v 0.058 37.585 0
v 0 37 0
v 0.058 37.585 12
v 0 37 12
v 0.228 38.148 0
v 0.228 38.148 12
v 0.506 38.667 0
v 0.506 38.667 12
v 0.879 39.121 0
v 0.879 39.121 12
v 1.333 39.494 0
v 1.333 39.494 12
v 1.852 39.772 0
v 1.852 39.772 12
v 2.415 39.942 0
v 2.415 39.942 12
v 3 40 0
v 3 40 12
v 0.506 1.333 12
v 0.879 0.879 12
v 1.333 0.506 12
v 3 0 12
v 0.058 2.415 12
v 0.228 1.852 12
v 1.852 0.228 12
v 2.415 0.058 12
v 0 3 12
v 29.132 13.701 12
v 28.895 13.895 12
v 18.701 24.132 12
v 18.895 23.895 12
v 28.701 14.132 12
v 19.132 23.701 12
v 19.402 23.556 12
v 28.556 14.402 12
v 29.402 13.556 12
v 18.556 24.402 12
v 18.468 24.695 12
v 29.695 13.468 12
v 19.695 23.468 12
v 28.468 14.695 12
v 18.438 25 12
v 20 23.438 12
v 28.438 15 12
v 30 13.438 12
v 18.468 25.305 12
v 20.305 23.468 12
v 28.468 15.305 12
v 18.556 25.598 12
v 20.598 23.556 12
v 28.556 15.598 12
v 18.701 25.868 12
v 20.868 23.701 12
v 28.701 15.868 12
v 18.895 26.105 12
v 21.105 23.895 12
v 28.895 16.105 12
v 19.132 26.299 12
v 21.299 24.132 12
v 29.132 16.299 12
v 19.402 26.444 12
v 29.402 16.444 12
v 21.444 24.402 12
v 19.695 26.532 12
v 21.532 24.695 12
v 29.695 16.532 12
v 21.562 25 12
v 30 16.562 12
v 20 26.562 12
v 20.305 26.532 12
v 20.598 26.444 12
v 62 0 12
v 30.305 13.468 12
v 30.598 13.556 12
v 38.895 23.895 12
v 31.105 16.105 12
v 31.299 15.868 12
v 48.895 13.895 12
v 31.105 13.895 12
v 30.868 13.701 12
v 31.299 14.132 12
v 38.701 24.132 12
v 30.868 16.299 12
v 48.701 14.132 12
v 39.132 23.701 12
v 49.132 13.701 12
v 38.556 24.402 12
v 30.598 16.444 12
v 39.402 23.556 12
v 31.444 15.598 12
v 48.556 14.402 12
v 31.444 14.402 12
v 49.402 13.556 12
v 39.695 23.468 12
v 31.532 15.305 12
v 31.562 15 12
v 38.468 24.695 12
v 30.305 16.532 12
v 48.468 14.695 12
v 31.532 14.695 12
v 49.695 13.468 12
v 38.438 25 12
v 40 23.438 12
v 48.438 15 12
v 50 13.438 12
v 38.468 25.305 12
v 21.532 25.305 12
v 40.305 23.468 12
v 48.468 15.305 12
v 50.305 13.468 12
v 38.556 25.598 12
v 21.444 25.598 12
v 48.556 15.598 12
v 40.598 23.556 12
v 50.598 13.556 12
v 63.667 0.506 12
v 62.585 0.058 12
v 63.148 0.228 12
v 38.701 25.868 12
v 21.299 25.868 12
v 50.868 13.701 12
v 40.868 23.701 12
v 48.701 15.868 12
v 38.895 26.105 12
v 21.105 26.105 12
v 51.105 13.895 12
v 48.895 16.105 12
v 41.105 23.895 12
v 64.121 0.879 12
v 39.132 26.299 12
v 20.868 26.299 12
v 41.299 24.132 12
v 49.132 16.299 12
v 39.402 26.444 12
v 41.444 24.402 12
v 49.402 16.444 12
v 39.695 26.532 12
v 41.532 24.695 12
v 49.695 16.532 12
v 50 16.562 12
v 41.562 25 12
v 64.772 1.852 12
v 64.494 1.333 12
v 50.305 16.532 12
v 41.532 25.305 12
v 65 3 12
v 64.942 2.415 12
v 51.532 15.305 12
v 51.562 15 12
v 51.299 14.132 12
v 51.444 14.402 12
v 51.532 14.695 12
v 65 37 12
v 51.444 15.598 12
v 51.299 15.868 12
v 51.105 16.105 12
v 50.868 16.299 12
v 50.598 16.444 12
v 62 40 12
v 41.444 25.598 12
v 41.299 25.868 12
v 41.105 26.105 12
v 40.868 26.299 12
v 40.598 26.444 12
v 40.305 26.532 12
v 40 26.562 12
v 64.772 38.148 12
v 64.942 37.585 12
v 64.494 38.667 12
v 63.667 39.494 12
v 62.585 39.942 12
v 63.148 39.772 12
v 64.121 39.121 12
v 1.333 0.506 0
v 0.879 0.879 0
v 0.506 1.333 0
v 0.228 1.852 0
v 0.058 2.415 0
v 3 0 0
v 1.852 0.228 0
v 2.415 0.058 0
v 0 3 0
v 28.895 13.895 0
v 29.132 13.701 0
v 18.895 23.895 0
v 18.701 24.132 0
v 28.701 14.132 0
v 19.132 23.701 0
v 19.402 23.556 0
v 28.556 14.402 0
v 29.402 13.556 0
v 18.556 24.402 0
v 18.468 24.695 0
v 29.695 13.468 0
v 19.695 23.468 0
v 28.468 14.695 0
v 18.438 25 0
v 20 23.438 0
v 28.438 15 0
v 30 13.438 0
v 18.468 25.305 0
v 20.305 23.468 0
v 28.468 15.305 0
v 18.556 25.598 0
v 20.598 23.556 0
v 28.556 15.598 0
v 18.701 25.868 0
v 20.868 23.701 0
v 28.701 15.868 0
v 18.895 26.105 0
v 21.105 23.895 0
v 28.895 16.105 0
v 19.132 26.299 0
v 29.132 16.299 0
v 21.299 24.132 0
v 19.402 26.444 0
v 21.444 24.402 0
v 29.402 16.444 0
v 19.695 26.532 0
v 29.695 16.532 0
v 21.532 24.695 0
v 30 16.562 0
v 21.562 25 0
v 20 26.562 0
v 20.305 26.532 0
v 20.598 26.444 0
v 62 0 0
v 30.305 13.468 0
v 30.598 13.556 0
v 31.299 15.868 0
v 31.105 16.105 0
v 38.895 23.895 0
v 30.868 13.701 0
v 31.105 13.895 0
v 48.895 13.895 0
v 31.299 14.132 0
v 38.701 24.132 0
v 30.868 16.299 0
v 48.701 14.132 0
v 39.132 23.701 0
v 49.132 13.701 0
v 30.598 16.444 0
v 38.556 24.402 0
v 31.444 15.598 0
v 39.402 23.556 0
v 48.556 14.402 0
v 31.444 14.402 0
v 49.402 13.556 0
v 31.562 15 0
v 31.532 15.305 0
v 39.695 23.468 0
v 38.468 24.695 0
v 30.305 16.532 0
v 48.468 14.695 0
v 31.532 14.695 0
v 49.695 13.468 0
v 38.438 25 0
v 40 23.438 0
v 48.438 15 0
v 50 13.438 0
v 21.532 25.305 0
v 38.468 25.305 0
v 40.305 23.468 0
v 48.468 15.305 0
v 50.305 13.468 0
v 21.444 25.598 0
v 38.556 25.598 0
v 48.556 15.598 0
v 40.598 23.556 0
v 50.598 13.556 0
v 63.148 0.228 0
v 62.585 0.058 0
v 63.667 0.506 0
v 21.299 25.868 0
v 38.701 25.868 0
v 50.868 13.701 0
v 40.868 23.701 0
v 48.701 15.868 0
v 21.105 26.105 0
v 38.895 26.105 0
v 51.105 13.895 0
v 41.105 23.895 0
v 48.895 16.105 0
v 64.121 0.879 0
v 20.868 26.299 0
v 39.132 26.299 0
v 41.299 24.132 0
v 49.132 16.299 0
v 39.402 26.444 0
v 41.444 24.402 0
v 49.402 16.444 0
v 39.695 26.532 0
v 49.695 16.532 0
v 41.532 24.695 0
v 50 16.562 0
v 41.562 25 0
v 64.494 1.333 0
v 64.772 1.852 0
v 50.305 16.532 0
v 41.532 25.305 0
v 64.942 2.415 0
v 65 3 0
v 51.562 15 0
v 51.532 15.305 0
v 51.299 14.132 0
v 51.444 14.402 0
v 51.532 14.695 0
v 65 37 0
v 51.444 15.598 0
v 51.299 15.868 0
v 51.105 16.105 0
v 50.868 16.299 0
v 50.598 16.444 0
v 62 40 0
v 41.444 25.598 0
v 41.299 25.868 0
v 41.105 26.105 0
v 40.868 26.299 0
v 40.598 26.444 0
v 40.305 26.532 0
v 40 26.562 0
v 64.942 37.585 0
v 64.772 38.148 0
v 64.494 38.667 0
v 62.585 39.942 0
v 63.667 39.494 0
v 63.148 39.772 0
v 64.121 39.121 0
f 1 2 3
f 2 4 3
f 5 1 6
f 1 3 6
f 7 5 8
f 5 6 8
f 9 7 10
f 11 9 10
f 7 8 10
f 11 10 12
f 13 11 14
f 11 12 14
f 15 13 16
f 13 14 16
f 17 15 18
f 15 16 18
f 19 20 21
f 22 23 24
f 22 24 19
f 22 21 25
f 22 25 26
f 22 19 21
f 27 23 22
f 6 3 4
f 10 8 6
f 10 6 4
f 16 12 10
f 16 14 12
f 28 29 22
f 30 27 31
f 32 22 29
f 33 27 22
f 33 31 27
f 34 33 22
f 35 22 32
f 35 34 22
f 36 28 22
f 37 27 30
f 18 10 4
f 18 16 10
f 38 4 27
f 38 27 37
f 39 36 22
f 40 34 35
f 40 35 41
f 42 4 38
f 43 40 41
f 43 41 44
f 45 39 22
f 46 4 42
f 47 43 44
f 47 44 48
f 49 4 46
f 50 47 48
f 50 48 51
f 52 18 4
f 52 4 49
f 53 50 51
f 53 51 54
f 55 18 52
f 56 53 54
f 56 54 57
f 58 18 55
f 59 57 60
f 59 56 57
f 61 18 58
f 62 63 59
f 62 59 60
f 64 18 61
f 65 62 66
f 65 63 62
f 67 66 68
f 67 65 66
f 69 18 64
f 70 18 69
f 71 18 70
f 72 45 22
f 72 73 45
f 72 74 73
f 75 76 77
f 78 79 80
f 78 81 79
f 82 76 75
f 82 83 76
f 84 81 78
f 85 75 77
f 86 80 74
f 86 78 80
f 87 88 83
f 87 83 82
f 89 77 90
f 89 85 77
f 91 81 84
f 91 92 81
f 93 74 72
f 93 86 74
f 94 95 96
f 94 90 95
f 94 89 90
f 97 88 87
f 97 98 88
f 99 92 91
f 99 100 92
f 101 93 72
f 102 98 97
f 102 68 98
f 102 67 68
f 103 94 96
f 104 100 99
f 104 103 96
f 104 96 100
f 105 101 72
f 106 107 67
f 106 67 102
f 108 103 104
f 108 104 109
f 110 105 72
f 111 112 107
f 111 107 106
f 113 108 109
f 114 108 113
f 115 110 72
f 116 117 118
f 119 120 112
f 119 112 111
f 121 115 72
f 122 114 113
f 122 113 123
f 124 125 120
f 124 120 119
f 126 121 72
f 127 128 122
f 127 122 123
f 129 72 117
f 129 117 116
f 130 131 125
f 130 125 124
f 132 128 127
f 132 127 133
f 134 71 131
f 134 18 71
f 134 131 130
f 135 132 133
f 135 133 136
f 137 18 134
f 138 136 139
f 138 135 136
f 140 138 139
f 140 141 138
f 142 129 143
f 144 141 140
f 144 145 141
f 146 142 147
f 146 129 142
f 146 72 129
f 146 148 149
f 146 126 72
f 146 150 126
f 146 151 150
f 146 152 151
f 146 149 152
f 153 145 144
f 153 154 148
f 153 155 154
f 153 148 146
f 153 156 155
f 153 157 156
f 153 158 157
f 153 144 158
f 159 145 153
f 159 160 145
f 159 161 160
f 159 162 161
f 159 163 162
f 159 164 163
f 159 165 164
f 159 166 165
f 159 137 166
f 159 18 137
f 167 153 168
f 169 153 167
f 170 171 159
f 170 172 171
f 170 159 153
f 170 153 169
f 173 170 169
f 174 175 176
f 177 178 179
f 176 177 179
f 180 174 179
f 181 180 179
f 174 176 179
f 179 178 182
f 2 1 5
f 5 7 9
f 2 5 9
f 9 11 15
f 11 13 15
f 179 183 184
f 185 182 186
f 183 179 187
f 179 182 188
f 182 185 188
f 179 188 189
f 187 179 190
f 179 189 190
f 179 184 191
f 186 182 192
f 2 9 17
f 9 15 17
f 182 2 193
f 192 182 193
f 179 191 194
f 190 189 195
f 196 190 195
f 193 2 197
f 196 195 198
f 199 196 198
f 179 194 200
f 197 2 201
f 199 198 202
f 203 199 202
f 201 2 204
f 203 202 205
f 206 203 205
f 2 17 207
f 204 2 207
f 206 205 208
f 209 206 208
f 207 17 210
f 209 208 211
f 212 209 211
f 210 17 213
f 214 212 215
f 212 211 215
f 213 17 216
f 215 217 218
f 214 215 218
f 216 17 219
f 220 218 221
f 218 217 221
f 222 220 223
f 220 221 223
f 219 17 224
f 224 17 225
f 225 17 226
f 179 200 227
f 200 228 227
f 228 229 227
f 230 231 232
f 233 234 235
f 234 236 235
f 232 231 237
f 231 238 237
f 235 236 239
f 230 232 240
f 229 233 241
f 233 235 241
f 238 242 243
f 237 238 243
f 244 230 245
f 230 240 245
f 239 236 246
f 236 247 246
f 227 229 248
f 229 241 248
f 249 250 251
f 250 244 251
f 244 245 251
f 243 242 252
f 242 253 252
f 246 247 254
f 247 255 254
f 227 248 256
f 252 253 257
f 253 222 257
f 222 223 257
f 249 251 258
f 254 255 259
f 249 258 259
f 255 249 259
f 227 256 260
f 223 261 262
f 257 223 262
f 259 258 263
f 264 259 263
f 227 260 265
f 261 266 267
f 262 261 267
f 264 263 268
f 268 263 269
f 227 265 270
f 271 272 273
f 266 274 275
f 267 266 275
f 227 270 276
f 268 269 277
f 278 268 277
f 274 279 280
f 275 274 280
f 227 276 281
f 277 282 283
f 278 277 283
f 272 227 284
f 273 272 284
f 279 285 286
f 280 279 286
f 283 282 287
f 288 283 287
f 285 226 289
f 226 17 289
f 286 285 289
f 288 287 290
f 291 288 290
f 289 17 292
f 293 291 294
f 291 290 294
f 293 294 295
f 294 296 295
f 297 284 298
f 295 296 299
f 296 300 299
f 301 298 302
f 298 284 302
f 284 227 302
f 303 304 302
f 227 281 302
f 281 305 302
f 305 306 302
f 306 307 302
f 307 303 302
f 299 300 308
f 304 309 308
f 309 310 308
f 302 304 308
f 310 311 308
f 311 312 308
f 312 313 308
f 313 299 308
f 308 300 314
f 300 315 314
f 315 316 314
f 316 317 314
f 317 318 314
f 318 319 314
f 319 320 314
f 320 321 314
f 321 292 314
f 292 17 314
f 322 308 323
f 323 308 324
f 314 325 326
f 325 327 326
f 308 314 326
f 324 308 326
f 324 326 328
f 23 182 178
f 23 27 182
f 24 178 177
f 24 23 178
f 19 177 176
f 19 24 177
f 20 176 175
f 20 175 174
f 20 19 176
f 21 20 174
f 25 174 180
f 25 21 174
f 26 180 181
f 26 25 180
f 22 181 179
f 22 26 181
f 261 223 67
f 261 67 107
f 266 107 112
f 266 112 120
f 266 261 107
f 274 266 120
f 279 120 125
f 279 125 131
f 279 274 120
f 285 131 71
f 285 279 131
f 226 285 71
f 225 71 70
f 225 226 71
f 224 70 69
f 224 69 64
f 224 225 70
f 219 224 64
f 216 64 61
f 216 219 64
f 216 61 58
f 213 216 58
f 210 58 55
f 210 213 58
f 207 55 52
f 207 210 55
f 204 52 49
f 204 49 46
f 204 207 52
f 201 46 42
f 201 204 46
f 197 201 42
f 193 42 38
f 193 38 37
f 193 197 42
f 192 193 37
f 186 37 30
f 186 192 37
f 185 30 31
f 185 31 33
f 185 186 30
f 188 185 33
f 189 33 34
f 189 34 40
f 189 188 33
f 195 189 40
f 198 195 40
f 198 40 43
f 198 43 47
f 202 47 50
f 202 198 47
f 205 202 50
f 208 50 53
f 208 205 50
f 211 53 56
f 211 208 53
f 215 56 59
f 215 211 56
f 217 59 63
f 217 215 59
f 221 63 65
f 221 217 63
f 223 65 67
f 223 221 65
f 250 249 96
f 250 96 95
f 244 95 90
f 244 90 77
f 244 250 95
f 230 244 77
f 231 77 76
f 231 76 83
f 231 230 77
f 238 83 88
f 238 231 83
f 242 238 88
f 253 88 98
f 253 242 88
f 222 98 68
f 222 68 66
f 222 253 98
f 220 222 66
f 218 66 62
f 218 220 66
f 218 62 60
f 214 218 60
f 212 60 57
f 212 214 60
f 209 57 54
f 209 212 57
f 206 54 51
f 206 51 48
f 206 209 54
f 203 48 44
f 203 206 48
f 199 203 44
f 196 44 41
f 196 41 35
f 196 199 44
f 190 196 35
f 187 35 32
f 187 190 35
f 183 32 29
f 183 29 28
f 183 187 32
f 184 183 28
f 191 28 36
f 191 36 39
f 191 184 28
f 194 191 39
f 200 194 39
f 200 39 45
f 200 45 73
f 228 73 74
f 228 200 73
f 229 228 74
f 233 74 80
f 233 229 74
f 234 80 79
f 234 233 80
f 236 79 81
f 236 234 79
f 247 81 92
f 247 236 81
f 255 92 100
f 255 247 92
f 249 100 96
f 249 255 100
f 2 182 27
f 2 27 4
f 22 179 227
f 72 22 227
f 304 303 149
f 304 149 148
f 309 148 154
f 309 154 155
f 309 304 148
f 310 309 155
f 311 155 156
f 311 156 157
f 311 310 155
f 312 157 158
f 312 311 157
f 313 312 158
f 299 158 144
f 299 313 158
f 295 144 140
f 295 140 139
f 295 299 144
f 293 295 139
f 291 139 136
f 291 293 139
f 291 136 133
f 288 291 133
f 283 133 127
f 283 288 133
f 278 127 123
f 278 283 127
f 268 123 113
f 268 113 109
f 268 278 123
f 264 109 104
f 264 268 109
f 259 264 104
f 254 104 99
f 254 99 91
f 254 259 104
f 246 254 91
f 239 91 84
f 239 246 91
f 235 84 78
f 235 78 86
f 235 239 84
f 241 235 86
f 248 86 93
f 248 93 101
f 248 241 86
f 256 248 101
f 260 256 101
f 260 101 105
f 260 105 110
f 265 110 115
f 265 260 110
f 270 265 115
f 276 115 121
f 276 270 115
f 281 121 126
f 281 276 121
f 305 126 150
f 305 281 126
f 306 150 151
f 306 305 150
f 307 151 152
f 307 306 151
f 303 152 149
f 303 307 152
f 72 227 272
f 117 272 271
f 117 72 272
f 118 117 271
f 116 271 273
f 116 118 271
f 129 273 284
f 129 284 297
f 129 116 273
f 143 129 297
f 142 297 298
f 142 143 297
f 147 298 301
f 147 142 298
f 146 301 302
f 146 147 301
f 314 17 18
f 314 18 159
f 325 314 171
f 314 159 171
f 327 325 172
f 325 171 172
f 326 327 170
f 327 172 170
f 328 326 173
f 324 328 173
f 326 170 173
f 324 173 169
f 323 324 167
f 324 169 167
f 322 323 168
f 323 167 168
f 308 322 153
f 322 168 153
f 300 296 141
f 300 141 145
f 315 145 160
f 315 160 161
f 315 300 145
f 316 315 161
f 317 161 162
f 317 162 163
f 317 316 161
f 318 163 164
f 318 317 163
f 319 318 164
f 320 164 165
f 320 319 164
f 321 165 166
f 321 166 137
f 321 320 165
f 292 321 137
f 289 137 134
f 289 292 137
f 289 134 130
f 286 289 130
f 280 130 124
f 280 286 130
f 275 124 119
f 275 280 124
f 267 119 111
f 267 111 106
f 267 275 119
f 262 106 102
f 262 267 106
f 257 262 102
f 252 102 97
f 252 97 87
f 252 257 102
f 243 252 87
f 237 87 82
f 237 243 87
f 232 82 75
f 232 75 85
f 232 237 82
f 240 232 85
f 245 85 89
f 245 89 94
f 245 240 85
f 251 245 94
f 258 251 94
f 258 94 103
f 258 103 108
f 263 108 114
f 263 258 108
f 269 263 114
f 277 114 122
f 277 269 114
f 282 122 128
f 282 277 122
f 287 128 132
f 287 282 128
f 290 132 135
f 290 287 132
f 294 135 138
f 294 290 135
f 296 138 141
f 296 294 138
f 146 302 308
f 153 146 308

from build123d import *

# Parameters (mm, degrees)
SKETCH_W  = 65
SKETCH_H  = 40
SKETCH_R  = 1.5625
PAD_DEPTH = 12
FILLET_R  = 3


with BuildPart() as part:
    # Sketch → Pad (new body)
    with BuildSketch(Plane.XY):
        with Locations((32.5, 20)):
            Rectangle(SKETCH_W, SKETCH_H)
        with Locations((20, 25)):
            Circle(SKETCH_R, mode=Mode.SUBTRACT)
        with Locations((40, 25)):
            Circle(SKETCH_R, mode=Mode.SUBTRACT)
        with Locations((30, 15)):
            Circle(SKETCH_R, mode=Mode.SUBTRACT)
        with Locations((50, 15)):
            Circle(SKETCH_R, mode=Mode.SUBTRACT)
    extrude(amount=PAD_DEPTH)

    # Fillet
    fillet_edges = [part.edges().sort_by_distance(p)[0] for p in [
        (65, 40, 6),
        (0, 40, 6),
        (0, 0, 6),
        (65, 0, 6),
    ]]
    fillet(fillet_edges, radius=FILLET_R)


solid = part.part
